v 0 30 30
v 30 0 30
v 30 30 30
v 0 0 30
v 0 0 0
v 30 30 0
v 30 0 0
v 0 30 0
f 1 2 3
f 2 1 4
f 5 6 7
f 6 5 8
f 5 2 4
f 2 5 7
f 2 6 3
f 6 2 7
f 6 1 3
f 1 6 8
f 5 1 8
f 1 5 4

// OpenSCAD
use <utilities/write.scad>
// include a ruler

module ruler(length = 150, t=[0,0,0], r=[0,0,0], line_color="white", ruler_color="black")
{
    mark_width = 0.125;
    mark_depth = 0.05;

    rotate(r) translate(t) union()
        {
            color(ruler_color) cube( [mark_depth-0.01, length, 8] );
            for ( i = [1:length-1] )
            {
                if (i % 10 == 0)	// tall one every 10
                {
                    translate( [0, i, 0] ) color(line_color) cube( [mark_depth, mark_width, 7 ] );
                    translate( [0, i+(2*mark_width), 6.5] ) rotate([90,0,90]) color("white") text(str(i), size=1,font = "Liberation Sans");
                }
                else if (i % 5 == 0)	// med. tall one every 5
                    translate( [0, i, 0] ) color(line_color) cube( [mark_depth, mark_width, 5 ] );
                else	// otherwise a short one
                    translate( [0, i, 0] ) color(line_color) cube( [mark_depth, mark_width, 3 ] );
            }
        }
}

module yruler(length = 150, line_color="white", ruler_color="black")
{
    ruler(length, line_color="white", ruler_color="black");
}

module xruler(length = 150, line_color="white", ruler_color="black")
{
    ruler(length, r=[0,0,-90], line_color="white", ruler_color="black");
}

module zruler(length = 150, line_color="white", ruler_color="black")
{
    ruler(length, r=[90,0,-45], line_color="white", ruler_color="black");
}

module xyzruler(length = 150, line_color="white", ruler_color="black")
{
    xruler(length, line_color="white", ruler_color="black");
    yruler(length, line_color="white", ruler_color="black");
    zruler(length, line_color="white", ruler_color="black");
}

// =======================================================================

// Test
// ====

module RulerTesting() {
	cube(30); 
	% xyzruler(32);
	}

RulerDebug=true;							// change to true for testing in this file

if (RulerDebug==true) 
	RulerTesting();

// =======================================================================
